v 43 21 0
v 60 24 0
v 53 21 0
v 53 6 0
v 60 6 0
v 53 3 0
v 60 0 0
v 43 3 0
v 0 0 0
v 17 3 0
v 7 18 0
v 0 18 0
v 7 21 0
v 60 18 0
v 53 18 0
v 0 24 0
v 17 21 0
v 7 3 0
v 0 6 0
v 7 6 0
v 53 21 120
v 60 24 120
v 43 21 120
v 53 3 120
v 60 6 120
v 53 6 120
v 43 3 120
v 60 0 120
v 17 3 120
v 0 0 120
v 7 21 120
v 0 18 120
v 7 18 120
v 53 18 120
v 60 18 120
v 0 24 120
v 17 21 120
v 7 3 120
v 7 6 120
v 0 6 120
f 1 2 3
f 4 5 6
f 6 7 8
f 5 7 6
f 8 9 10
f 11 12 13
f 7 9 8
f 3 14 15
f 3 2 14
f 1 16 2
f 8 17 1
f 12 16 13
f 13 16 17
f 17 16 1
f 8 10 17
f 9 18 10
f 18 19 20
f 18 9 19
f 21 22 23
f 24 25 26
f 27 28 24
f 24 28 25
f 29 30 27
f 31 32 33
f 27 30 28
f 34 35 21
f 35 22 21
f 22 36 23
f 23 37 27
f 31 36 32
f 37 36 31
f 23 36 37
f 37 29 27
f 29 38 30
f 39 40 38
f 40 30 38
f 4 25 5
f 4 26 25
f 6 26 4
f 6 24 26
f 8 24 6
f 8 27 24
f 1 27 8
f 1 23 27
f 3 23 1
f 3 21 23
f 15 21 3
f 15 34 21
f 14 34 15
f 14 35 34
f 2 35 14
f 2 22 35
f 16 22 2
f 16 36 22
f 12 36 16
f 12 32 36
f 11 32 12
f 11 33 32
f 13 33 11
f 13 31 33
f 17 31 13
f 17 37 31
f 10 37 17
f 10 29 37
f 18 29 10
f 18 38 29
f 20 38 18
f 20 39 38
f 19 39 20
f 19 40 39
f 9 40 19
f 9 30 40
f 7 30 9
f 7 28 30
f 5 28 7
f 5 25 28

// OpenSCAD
$fn = 32;

// ----------------------------------------------------------------------
// T-slot rail: 60 x 24 mm section, 120 mm long
// ----------------------------------------------------------------------

// --- parameters (mm) ---
profile_height = 120;     // extrusion height
profile_points = 20;      // points of the closed outline

profile = [[0, 0], [60, 0], [60, 6], [53, 6], [53, 3], [43, 3], [43, 21], [53, 21], [53, 18], [60, 18], [60, 24], [0, 24], [0, 18], [7, 18], [7, 21], [17, 21], [17, 3], [7, 3], [7, 6], [0, 6]];  // single closed polygon, 20 points, counter clockwise

// --- the one profile operation ---
linear_extrude(height = profile_height) polygon(points = profile);
